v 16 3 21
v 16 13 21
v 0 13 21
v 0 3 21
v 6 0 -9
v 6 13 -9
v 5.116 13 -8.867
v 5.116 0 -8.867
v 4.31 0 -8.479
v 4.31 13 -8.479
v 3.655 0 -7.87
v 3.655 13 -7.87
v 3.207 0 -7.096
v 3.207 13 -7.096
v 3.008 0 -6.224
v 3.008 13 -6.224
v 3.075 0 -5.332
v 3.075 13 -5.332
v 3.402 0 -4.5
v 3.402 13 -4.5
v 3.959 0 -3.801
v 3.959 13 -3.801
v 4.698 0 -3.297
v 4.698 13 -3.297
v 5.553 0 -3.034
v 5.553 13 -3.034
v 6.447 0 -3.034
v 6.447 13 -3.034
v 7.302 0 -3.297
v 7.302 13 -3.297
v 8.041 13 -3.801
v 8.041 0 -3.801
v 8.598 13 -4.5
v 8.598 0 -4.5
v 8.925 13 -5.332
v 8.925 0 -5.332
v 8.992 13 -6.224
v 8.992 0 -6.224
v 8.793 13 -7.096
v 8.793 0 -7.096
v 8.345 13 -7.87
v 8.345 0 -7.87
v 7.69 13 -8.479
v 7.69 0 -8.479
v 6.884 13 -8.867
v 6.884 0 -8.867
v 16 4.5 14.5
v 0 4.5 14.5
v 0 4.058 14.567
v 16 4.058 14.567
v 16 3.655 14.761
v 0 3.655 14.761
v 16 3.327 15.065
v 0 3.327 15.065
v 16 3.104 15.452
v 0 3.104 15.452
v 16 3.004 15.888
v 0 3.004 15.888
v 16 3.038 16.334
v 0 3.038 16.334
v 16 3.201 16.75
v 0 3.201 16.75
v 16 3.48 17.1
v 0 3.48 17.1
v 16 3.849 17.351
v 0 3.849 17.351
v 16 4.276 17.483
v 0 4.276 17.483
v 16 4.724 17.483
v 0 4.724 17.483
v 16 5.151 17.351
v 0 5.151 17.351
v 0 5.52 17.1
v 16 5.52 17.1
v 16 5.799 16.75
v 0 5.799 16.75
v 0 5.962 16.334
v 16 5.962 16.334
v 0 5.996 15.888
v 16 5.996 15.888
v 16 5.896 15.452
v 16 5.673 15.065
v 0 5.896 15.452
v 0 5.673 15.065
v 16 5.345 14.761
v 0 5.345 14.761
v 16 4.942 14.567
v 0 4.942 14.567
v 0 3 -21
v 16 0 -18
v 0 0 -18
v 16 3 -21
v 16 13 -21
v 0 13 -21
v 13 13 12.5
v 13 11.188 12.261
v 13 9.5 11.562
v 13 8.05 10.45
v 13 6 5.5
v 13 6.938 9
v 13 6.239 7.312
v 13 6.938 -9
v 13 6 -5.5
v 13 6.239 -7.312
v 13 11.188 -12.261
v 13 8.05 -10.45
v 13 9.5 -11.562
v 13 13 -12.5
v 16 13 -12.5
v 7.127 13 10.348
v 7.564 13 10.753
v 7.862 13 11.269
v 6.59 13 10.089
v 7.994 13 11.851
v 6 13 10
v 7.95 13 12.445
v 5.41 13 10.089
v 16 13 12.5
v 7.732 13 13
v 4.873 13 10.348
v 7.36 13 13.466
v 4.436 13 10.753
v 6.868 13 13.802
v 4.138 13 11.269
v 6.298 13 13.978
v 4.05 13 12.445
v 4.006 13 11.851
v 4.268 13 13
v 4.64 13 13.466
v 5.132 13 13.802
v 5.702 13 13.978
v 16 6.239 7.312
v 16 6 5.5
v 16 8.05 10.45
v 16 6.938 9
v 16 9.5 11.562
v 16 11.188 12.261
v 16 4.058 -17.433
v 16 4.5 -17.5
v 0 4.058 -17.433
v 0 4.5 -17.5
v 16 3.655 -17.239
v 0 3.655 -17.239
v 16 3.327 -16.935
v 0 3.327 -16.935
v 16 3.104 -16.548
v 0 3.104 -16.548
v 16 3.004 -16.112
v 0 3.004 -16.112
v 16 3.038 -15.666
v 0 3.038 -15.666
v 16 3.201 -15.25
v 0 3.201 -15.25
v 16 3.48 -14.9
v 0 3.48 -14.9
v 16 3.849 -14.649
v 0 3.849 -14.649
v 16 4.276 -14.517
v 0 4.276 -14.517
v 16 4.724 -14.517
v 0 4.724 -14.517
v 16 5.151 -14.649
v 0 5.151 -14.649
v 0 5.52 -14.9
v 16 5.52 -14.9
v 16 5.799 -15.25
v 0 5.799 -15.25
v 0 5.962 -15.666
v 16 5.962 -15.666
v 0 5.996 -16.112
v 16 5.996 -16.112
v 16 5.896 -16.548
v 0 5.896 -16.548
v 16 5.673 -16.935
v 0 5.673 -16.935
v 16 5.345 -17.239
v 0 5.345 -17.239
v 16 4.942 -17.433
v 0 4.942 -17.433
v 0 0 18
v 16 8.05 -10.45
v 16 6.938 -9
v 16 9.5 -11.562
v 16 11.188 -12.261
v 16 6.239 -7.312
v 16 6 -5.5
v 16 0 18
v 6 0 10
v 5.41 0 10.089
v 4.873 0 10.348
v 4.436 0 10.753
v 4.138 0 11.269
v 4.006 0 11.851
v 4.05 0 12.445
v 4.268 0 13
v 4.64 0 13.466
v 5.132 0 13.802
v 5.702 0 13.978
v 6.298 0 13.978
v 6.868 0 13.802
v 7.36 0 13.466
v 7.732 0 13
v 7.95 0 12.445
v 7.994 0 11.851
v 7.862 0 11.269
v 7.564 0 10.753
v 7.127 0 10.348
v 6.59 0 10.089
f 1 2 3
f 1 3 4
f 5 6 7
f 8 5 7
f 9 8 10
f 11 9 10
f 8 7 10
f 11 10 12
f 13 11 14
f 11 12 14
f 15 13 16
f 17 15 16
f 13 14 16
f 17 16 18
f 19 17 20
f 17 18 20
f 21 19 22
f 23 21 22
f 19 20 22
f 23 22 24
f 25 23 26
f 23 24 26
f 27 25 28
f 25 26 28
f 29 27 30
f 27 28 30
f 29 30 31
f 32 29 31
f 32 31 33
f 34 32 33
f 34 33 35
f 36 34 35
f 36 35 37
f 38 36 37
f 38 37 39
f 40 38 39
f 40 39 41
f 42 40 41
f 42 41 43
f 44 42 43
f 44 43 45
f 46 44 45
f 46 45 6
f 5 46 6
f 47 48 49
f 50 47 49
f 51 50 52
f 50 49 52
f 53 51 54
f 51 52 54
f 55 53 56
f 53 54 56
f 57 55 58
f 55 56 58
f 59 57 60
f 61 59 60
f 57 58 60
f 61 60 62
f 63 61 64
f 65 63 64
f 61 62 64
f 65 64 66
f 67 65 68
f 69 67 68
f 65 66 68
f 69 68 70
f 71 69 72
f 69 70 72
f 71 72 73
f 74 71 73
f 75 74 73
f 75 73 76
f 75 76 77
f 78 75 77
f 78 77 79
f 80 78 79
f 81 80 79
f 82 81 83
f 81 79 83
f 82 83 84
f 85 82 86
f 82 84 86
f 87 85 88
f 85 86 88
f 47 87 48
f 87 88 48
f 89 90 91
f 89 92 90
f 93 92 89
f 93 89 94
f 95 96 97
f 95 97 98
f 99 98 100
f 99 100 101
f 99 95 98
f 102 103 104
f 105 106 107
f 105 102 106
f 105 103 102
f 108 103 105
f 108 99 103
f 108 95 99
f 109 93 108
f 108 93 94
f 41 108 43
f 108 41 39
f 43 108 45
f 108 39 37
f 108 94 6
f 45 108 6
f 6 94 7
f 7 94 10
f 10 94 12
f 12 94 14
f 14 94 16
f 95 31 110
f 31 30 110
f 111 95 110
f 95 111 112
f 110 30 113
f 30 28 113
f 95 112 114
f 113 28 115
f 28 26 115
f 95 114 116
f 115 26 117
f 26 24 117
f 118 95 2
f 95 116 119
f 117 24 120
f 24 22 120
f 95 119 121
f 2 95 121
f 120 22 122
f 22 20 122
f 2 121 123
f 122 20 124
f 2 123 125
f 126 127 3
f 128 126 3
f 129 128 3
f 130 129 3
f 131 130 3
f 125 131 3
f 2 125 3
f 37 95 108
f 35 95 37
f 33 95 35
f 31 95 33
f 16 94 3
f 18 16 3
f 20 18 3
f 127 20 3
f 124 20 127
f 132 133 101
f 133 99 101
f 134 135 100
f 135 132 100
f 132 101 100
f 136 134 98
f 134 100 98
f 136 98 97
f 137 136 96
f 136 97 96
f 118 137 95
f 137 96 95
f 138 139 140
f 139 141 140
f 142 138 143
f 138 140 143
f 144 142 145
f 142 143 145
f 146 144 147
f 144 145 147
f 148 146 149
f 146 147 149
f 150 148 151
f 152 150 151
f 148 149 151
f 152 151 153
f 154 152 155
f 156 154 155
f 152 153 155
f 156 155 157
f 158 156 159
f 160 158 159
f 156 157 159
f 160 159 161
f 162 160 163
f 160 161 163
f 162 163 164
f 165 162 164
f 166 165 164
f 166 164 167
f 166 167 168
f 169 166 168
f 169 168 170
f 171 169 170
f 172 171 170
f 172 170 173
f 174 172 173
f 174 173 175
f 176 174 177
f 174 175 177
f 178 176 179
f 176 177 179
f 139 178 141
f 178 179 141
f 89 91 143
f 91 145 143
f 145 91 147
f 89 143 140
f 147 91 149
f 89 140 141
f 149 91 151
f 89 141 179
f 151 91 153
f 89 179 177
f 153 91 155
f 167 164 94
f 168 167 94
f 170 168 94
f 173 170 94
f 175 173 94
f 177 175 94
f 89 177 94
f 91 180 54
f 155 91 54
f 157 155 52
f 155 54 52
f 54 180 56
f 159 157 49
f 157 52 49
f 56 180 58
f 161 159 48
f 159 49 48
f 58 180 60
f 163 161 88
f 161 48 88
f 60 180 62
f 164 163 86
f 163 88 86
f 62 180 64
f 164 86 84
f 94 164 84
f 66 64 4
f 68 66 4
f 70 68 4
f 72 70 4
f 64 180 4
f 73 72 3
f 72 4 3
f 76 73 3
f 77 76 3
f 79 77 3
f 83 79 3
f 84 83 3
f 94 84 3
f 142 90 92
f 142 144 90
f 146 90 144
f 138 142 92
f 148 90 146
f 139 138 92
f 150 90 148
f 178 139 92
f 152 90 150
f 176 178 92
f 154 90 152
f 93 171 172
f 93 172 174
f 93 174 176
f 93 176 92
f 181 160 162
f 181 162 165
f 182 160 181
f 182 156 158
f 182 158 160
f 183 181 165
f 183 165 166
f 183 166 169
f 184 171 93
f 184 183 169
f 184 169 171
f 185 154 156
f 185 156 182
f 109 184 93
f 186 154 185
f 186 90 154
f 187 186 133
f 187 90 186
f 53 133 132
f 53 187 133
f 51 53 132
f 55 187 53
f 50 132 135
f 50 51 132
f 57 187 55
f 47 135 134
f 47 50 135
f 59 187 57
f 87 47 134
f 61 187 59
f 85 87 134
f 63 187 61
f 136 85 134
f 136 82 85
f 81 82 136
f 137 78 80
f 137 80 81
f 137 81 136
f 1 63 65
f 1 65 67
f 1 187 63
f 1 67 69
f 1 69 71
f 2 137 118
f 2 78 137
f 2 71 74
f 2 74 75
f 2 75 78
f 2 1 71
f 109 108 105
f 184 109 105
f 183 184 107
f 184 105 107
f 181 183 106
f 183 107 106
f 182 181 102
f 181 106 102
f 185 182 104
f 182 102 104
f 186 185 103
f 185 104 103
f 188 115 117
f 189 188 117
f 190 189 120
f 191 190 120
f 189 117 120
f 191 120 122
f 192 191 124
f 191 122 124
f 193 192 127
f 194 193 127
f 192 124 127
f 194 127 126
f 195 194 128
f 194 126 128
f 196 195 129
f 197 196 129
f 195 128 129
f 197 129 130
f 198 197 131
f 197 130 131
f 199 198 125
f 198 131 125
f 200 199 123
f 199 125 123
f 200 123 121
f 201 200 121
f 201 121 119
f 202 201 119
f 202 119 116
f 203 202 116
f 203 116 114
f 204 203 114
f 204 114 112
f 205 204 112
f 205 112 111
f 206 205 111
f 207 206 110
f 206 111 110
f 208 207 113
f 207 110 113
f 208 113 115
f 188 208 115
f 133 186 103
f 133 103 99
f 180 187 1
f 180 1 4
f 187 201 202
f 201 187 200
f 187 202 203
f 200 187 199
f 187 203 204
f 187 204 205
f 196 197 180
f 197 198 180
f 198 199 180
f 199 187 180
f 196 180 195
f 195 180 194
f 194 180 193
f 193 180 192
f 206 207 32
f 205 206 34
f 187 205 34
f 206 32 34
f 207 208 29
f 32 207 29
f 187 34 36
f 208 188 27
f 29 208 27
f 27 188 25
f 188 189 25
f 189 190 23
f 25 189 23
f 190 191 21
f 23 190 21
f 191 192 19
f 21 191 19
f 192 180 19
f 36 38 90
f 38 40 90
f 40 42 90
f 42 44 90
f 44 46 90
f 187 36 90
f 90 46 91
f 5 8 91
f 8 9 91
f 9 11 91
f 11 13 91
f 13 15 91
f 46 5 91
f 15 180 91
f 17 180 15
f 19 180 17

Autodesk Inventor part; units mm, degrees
ref_plane "YZ Plane" through (0, 0, 0) normal (1, 0, 0) x (0, 1, 0)
ref_plane "XZ Plane" through (0, 0, 0) normal (0, 1, 0) x (-1, 0, 0)
ref_plane "XY Plane" through (0, 0, 0) normal (0, 0, 1) x (1, 0, 0)
sketch "Szkic1" plane through (0, 0, 0) normal (1, 0, 0) x (0, 1, 0)
  line L0 (13, 21) -> (0, 21)
  line L1 (0, 21) -> (0, -21)
  line L2 (0, -21) -> (13, -21)
  line L3 (13, -21) -> (13, 21)
  line L4 (0, 0) -> (13, 0) construction
  dimension "d0" = 42
  dimension "d1" = 13
extrude "Wyciągnięcie proste3" add sketch "Szkic1" along normal blind 16
sketch "Szkic4" plane through (16, 0, 0) normal (1, 0, 0) x (0, 0, -1)
  line L0 (-12.5, 13) -> (12.5, 13)
  line L1 (12.5, 13) -> (12.5, 6)
  line L2 (12.5, 6) -> (-12.5, 6)
  line L3 (-12.5, 6) -> (-12.5, 13)
  line L4 (0, 6) -> (0, 0) construction
  line L5 (21, 13) -> (-21, 13) projected
  point P0 (0, 13)
  dimension "d10" = 25
  dimension "d11" = 7
extrude "Wyciągnięcie proste4" cut sketch "Szkic4" against normal blind 3
fillet "Zaokrąglenie1" radius 7 2 edges at (14.5, 6, 12.5) (14.5, 6, -12.5)
sketch "Szkic5" plane through (16, 0, 0) normal (1, 0, 0) x (0, 0, -1)
  line L0 (0, 0) -> (0, 13) construction
  line L1 (-12.5, 13) -> (12.5, 13) projected
  line L2 (-21, 13) -> (-21, 0) projected
  line L3 (-21, 0) -> (21, 0) projected
  point P0 (-16, 4.5)
  point P1 (16, 4.5)
  dimension "d15" = 32
  dimension "d17" = 4.5
hole "Otwór1" at (16, 4.5, 16) at (16, 4.5, -16) direction (-1, 0, 0) diameter 3 end through all
chamfer "Faza1" distance 3 angle 45 2 edges at (8, 0, 21) (8, 0, -21)
sketch "Szkic6" plane through (0, 0, -18) normal (0, -1, 0) x (1, 0, 0)
  line L0 (0, -3) -> (16, -3) projected
  line L1 (0, 36) -> (0, 0) projected
  point P0 (0, 18)
  point P1 (6, 12)
  dimension "d28" = 15
  dimension "d29" = 6
hole "Otwór2" at (6, 0, -6) direction (0, 1, 0) diameter 6 end through all
sketch "Szkic7" plane through (0, 0, -18) normal (0, -1, 0) x (1, 0, 0)
  line L0 (16, 39) -> (0, 39) projected
  circle A0 centre (6, 12) radius 3 projected
  point P0 (0, 18)
  point P1 (6, 30)
  dimension "d37" = 9
hole "Otwór3" at (6, 0, 12) direction (0, 1, 0) diameter 4 end through all
thread "Gwint1" size "M6x1" class "6H" standard "ANSI Metric M Profile" full length
thread "Gwint2" size "M4x0.7" class "6H" standard "ANSI Metric M Profile" full length
thread "Gwint3" size "M3x0.5" class "6H" standard "ANSI Metric M Profile" full length
thread "Gwint4" size "M3x0.5" class "6H" standard "ANSI Metric M Profile" full length
properties part number "33_ekstruder1"
